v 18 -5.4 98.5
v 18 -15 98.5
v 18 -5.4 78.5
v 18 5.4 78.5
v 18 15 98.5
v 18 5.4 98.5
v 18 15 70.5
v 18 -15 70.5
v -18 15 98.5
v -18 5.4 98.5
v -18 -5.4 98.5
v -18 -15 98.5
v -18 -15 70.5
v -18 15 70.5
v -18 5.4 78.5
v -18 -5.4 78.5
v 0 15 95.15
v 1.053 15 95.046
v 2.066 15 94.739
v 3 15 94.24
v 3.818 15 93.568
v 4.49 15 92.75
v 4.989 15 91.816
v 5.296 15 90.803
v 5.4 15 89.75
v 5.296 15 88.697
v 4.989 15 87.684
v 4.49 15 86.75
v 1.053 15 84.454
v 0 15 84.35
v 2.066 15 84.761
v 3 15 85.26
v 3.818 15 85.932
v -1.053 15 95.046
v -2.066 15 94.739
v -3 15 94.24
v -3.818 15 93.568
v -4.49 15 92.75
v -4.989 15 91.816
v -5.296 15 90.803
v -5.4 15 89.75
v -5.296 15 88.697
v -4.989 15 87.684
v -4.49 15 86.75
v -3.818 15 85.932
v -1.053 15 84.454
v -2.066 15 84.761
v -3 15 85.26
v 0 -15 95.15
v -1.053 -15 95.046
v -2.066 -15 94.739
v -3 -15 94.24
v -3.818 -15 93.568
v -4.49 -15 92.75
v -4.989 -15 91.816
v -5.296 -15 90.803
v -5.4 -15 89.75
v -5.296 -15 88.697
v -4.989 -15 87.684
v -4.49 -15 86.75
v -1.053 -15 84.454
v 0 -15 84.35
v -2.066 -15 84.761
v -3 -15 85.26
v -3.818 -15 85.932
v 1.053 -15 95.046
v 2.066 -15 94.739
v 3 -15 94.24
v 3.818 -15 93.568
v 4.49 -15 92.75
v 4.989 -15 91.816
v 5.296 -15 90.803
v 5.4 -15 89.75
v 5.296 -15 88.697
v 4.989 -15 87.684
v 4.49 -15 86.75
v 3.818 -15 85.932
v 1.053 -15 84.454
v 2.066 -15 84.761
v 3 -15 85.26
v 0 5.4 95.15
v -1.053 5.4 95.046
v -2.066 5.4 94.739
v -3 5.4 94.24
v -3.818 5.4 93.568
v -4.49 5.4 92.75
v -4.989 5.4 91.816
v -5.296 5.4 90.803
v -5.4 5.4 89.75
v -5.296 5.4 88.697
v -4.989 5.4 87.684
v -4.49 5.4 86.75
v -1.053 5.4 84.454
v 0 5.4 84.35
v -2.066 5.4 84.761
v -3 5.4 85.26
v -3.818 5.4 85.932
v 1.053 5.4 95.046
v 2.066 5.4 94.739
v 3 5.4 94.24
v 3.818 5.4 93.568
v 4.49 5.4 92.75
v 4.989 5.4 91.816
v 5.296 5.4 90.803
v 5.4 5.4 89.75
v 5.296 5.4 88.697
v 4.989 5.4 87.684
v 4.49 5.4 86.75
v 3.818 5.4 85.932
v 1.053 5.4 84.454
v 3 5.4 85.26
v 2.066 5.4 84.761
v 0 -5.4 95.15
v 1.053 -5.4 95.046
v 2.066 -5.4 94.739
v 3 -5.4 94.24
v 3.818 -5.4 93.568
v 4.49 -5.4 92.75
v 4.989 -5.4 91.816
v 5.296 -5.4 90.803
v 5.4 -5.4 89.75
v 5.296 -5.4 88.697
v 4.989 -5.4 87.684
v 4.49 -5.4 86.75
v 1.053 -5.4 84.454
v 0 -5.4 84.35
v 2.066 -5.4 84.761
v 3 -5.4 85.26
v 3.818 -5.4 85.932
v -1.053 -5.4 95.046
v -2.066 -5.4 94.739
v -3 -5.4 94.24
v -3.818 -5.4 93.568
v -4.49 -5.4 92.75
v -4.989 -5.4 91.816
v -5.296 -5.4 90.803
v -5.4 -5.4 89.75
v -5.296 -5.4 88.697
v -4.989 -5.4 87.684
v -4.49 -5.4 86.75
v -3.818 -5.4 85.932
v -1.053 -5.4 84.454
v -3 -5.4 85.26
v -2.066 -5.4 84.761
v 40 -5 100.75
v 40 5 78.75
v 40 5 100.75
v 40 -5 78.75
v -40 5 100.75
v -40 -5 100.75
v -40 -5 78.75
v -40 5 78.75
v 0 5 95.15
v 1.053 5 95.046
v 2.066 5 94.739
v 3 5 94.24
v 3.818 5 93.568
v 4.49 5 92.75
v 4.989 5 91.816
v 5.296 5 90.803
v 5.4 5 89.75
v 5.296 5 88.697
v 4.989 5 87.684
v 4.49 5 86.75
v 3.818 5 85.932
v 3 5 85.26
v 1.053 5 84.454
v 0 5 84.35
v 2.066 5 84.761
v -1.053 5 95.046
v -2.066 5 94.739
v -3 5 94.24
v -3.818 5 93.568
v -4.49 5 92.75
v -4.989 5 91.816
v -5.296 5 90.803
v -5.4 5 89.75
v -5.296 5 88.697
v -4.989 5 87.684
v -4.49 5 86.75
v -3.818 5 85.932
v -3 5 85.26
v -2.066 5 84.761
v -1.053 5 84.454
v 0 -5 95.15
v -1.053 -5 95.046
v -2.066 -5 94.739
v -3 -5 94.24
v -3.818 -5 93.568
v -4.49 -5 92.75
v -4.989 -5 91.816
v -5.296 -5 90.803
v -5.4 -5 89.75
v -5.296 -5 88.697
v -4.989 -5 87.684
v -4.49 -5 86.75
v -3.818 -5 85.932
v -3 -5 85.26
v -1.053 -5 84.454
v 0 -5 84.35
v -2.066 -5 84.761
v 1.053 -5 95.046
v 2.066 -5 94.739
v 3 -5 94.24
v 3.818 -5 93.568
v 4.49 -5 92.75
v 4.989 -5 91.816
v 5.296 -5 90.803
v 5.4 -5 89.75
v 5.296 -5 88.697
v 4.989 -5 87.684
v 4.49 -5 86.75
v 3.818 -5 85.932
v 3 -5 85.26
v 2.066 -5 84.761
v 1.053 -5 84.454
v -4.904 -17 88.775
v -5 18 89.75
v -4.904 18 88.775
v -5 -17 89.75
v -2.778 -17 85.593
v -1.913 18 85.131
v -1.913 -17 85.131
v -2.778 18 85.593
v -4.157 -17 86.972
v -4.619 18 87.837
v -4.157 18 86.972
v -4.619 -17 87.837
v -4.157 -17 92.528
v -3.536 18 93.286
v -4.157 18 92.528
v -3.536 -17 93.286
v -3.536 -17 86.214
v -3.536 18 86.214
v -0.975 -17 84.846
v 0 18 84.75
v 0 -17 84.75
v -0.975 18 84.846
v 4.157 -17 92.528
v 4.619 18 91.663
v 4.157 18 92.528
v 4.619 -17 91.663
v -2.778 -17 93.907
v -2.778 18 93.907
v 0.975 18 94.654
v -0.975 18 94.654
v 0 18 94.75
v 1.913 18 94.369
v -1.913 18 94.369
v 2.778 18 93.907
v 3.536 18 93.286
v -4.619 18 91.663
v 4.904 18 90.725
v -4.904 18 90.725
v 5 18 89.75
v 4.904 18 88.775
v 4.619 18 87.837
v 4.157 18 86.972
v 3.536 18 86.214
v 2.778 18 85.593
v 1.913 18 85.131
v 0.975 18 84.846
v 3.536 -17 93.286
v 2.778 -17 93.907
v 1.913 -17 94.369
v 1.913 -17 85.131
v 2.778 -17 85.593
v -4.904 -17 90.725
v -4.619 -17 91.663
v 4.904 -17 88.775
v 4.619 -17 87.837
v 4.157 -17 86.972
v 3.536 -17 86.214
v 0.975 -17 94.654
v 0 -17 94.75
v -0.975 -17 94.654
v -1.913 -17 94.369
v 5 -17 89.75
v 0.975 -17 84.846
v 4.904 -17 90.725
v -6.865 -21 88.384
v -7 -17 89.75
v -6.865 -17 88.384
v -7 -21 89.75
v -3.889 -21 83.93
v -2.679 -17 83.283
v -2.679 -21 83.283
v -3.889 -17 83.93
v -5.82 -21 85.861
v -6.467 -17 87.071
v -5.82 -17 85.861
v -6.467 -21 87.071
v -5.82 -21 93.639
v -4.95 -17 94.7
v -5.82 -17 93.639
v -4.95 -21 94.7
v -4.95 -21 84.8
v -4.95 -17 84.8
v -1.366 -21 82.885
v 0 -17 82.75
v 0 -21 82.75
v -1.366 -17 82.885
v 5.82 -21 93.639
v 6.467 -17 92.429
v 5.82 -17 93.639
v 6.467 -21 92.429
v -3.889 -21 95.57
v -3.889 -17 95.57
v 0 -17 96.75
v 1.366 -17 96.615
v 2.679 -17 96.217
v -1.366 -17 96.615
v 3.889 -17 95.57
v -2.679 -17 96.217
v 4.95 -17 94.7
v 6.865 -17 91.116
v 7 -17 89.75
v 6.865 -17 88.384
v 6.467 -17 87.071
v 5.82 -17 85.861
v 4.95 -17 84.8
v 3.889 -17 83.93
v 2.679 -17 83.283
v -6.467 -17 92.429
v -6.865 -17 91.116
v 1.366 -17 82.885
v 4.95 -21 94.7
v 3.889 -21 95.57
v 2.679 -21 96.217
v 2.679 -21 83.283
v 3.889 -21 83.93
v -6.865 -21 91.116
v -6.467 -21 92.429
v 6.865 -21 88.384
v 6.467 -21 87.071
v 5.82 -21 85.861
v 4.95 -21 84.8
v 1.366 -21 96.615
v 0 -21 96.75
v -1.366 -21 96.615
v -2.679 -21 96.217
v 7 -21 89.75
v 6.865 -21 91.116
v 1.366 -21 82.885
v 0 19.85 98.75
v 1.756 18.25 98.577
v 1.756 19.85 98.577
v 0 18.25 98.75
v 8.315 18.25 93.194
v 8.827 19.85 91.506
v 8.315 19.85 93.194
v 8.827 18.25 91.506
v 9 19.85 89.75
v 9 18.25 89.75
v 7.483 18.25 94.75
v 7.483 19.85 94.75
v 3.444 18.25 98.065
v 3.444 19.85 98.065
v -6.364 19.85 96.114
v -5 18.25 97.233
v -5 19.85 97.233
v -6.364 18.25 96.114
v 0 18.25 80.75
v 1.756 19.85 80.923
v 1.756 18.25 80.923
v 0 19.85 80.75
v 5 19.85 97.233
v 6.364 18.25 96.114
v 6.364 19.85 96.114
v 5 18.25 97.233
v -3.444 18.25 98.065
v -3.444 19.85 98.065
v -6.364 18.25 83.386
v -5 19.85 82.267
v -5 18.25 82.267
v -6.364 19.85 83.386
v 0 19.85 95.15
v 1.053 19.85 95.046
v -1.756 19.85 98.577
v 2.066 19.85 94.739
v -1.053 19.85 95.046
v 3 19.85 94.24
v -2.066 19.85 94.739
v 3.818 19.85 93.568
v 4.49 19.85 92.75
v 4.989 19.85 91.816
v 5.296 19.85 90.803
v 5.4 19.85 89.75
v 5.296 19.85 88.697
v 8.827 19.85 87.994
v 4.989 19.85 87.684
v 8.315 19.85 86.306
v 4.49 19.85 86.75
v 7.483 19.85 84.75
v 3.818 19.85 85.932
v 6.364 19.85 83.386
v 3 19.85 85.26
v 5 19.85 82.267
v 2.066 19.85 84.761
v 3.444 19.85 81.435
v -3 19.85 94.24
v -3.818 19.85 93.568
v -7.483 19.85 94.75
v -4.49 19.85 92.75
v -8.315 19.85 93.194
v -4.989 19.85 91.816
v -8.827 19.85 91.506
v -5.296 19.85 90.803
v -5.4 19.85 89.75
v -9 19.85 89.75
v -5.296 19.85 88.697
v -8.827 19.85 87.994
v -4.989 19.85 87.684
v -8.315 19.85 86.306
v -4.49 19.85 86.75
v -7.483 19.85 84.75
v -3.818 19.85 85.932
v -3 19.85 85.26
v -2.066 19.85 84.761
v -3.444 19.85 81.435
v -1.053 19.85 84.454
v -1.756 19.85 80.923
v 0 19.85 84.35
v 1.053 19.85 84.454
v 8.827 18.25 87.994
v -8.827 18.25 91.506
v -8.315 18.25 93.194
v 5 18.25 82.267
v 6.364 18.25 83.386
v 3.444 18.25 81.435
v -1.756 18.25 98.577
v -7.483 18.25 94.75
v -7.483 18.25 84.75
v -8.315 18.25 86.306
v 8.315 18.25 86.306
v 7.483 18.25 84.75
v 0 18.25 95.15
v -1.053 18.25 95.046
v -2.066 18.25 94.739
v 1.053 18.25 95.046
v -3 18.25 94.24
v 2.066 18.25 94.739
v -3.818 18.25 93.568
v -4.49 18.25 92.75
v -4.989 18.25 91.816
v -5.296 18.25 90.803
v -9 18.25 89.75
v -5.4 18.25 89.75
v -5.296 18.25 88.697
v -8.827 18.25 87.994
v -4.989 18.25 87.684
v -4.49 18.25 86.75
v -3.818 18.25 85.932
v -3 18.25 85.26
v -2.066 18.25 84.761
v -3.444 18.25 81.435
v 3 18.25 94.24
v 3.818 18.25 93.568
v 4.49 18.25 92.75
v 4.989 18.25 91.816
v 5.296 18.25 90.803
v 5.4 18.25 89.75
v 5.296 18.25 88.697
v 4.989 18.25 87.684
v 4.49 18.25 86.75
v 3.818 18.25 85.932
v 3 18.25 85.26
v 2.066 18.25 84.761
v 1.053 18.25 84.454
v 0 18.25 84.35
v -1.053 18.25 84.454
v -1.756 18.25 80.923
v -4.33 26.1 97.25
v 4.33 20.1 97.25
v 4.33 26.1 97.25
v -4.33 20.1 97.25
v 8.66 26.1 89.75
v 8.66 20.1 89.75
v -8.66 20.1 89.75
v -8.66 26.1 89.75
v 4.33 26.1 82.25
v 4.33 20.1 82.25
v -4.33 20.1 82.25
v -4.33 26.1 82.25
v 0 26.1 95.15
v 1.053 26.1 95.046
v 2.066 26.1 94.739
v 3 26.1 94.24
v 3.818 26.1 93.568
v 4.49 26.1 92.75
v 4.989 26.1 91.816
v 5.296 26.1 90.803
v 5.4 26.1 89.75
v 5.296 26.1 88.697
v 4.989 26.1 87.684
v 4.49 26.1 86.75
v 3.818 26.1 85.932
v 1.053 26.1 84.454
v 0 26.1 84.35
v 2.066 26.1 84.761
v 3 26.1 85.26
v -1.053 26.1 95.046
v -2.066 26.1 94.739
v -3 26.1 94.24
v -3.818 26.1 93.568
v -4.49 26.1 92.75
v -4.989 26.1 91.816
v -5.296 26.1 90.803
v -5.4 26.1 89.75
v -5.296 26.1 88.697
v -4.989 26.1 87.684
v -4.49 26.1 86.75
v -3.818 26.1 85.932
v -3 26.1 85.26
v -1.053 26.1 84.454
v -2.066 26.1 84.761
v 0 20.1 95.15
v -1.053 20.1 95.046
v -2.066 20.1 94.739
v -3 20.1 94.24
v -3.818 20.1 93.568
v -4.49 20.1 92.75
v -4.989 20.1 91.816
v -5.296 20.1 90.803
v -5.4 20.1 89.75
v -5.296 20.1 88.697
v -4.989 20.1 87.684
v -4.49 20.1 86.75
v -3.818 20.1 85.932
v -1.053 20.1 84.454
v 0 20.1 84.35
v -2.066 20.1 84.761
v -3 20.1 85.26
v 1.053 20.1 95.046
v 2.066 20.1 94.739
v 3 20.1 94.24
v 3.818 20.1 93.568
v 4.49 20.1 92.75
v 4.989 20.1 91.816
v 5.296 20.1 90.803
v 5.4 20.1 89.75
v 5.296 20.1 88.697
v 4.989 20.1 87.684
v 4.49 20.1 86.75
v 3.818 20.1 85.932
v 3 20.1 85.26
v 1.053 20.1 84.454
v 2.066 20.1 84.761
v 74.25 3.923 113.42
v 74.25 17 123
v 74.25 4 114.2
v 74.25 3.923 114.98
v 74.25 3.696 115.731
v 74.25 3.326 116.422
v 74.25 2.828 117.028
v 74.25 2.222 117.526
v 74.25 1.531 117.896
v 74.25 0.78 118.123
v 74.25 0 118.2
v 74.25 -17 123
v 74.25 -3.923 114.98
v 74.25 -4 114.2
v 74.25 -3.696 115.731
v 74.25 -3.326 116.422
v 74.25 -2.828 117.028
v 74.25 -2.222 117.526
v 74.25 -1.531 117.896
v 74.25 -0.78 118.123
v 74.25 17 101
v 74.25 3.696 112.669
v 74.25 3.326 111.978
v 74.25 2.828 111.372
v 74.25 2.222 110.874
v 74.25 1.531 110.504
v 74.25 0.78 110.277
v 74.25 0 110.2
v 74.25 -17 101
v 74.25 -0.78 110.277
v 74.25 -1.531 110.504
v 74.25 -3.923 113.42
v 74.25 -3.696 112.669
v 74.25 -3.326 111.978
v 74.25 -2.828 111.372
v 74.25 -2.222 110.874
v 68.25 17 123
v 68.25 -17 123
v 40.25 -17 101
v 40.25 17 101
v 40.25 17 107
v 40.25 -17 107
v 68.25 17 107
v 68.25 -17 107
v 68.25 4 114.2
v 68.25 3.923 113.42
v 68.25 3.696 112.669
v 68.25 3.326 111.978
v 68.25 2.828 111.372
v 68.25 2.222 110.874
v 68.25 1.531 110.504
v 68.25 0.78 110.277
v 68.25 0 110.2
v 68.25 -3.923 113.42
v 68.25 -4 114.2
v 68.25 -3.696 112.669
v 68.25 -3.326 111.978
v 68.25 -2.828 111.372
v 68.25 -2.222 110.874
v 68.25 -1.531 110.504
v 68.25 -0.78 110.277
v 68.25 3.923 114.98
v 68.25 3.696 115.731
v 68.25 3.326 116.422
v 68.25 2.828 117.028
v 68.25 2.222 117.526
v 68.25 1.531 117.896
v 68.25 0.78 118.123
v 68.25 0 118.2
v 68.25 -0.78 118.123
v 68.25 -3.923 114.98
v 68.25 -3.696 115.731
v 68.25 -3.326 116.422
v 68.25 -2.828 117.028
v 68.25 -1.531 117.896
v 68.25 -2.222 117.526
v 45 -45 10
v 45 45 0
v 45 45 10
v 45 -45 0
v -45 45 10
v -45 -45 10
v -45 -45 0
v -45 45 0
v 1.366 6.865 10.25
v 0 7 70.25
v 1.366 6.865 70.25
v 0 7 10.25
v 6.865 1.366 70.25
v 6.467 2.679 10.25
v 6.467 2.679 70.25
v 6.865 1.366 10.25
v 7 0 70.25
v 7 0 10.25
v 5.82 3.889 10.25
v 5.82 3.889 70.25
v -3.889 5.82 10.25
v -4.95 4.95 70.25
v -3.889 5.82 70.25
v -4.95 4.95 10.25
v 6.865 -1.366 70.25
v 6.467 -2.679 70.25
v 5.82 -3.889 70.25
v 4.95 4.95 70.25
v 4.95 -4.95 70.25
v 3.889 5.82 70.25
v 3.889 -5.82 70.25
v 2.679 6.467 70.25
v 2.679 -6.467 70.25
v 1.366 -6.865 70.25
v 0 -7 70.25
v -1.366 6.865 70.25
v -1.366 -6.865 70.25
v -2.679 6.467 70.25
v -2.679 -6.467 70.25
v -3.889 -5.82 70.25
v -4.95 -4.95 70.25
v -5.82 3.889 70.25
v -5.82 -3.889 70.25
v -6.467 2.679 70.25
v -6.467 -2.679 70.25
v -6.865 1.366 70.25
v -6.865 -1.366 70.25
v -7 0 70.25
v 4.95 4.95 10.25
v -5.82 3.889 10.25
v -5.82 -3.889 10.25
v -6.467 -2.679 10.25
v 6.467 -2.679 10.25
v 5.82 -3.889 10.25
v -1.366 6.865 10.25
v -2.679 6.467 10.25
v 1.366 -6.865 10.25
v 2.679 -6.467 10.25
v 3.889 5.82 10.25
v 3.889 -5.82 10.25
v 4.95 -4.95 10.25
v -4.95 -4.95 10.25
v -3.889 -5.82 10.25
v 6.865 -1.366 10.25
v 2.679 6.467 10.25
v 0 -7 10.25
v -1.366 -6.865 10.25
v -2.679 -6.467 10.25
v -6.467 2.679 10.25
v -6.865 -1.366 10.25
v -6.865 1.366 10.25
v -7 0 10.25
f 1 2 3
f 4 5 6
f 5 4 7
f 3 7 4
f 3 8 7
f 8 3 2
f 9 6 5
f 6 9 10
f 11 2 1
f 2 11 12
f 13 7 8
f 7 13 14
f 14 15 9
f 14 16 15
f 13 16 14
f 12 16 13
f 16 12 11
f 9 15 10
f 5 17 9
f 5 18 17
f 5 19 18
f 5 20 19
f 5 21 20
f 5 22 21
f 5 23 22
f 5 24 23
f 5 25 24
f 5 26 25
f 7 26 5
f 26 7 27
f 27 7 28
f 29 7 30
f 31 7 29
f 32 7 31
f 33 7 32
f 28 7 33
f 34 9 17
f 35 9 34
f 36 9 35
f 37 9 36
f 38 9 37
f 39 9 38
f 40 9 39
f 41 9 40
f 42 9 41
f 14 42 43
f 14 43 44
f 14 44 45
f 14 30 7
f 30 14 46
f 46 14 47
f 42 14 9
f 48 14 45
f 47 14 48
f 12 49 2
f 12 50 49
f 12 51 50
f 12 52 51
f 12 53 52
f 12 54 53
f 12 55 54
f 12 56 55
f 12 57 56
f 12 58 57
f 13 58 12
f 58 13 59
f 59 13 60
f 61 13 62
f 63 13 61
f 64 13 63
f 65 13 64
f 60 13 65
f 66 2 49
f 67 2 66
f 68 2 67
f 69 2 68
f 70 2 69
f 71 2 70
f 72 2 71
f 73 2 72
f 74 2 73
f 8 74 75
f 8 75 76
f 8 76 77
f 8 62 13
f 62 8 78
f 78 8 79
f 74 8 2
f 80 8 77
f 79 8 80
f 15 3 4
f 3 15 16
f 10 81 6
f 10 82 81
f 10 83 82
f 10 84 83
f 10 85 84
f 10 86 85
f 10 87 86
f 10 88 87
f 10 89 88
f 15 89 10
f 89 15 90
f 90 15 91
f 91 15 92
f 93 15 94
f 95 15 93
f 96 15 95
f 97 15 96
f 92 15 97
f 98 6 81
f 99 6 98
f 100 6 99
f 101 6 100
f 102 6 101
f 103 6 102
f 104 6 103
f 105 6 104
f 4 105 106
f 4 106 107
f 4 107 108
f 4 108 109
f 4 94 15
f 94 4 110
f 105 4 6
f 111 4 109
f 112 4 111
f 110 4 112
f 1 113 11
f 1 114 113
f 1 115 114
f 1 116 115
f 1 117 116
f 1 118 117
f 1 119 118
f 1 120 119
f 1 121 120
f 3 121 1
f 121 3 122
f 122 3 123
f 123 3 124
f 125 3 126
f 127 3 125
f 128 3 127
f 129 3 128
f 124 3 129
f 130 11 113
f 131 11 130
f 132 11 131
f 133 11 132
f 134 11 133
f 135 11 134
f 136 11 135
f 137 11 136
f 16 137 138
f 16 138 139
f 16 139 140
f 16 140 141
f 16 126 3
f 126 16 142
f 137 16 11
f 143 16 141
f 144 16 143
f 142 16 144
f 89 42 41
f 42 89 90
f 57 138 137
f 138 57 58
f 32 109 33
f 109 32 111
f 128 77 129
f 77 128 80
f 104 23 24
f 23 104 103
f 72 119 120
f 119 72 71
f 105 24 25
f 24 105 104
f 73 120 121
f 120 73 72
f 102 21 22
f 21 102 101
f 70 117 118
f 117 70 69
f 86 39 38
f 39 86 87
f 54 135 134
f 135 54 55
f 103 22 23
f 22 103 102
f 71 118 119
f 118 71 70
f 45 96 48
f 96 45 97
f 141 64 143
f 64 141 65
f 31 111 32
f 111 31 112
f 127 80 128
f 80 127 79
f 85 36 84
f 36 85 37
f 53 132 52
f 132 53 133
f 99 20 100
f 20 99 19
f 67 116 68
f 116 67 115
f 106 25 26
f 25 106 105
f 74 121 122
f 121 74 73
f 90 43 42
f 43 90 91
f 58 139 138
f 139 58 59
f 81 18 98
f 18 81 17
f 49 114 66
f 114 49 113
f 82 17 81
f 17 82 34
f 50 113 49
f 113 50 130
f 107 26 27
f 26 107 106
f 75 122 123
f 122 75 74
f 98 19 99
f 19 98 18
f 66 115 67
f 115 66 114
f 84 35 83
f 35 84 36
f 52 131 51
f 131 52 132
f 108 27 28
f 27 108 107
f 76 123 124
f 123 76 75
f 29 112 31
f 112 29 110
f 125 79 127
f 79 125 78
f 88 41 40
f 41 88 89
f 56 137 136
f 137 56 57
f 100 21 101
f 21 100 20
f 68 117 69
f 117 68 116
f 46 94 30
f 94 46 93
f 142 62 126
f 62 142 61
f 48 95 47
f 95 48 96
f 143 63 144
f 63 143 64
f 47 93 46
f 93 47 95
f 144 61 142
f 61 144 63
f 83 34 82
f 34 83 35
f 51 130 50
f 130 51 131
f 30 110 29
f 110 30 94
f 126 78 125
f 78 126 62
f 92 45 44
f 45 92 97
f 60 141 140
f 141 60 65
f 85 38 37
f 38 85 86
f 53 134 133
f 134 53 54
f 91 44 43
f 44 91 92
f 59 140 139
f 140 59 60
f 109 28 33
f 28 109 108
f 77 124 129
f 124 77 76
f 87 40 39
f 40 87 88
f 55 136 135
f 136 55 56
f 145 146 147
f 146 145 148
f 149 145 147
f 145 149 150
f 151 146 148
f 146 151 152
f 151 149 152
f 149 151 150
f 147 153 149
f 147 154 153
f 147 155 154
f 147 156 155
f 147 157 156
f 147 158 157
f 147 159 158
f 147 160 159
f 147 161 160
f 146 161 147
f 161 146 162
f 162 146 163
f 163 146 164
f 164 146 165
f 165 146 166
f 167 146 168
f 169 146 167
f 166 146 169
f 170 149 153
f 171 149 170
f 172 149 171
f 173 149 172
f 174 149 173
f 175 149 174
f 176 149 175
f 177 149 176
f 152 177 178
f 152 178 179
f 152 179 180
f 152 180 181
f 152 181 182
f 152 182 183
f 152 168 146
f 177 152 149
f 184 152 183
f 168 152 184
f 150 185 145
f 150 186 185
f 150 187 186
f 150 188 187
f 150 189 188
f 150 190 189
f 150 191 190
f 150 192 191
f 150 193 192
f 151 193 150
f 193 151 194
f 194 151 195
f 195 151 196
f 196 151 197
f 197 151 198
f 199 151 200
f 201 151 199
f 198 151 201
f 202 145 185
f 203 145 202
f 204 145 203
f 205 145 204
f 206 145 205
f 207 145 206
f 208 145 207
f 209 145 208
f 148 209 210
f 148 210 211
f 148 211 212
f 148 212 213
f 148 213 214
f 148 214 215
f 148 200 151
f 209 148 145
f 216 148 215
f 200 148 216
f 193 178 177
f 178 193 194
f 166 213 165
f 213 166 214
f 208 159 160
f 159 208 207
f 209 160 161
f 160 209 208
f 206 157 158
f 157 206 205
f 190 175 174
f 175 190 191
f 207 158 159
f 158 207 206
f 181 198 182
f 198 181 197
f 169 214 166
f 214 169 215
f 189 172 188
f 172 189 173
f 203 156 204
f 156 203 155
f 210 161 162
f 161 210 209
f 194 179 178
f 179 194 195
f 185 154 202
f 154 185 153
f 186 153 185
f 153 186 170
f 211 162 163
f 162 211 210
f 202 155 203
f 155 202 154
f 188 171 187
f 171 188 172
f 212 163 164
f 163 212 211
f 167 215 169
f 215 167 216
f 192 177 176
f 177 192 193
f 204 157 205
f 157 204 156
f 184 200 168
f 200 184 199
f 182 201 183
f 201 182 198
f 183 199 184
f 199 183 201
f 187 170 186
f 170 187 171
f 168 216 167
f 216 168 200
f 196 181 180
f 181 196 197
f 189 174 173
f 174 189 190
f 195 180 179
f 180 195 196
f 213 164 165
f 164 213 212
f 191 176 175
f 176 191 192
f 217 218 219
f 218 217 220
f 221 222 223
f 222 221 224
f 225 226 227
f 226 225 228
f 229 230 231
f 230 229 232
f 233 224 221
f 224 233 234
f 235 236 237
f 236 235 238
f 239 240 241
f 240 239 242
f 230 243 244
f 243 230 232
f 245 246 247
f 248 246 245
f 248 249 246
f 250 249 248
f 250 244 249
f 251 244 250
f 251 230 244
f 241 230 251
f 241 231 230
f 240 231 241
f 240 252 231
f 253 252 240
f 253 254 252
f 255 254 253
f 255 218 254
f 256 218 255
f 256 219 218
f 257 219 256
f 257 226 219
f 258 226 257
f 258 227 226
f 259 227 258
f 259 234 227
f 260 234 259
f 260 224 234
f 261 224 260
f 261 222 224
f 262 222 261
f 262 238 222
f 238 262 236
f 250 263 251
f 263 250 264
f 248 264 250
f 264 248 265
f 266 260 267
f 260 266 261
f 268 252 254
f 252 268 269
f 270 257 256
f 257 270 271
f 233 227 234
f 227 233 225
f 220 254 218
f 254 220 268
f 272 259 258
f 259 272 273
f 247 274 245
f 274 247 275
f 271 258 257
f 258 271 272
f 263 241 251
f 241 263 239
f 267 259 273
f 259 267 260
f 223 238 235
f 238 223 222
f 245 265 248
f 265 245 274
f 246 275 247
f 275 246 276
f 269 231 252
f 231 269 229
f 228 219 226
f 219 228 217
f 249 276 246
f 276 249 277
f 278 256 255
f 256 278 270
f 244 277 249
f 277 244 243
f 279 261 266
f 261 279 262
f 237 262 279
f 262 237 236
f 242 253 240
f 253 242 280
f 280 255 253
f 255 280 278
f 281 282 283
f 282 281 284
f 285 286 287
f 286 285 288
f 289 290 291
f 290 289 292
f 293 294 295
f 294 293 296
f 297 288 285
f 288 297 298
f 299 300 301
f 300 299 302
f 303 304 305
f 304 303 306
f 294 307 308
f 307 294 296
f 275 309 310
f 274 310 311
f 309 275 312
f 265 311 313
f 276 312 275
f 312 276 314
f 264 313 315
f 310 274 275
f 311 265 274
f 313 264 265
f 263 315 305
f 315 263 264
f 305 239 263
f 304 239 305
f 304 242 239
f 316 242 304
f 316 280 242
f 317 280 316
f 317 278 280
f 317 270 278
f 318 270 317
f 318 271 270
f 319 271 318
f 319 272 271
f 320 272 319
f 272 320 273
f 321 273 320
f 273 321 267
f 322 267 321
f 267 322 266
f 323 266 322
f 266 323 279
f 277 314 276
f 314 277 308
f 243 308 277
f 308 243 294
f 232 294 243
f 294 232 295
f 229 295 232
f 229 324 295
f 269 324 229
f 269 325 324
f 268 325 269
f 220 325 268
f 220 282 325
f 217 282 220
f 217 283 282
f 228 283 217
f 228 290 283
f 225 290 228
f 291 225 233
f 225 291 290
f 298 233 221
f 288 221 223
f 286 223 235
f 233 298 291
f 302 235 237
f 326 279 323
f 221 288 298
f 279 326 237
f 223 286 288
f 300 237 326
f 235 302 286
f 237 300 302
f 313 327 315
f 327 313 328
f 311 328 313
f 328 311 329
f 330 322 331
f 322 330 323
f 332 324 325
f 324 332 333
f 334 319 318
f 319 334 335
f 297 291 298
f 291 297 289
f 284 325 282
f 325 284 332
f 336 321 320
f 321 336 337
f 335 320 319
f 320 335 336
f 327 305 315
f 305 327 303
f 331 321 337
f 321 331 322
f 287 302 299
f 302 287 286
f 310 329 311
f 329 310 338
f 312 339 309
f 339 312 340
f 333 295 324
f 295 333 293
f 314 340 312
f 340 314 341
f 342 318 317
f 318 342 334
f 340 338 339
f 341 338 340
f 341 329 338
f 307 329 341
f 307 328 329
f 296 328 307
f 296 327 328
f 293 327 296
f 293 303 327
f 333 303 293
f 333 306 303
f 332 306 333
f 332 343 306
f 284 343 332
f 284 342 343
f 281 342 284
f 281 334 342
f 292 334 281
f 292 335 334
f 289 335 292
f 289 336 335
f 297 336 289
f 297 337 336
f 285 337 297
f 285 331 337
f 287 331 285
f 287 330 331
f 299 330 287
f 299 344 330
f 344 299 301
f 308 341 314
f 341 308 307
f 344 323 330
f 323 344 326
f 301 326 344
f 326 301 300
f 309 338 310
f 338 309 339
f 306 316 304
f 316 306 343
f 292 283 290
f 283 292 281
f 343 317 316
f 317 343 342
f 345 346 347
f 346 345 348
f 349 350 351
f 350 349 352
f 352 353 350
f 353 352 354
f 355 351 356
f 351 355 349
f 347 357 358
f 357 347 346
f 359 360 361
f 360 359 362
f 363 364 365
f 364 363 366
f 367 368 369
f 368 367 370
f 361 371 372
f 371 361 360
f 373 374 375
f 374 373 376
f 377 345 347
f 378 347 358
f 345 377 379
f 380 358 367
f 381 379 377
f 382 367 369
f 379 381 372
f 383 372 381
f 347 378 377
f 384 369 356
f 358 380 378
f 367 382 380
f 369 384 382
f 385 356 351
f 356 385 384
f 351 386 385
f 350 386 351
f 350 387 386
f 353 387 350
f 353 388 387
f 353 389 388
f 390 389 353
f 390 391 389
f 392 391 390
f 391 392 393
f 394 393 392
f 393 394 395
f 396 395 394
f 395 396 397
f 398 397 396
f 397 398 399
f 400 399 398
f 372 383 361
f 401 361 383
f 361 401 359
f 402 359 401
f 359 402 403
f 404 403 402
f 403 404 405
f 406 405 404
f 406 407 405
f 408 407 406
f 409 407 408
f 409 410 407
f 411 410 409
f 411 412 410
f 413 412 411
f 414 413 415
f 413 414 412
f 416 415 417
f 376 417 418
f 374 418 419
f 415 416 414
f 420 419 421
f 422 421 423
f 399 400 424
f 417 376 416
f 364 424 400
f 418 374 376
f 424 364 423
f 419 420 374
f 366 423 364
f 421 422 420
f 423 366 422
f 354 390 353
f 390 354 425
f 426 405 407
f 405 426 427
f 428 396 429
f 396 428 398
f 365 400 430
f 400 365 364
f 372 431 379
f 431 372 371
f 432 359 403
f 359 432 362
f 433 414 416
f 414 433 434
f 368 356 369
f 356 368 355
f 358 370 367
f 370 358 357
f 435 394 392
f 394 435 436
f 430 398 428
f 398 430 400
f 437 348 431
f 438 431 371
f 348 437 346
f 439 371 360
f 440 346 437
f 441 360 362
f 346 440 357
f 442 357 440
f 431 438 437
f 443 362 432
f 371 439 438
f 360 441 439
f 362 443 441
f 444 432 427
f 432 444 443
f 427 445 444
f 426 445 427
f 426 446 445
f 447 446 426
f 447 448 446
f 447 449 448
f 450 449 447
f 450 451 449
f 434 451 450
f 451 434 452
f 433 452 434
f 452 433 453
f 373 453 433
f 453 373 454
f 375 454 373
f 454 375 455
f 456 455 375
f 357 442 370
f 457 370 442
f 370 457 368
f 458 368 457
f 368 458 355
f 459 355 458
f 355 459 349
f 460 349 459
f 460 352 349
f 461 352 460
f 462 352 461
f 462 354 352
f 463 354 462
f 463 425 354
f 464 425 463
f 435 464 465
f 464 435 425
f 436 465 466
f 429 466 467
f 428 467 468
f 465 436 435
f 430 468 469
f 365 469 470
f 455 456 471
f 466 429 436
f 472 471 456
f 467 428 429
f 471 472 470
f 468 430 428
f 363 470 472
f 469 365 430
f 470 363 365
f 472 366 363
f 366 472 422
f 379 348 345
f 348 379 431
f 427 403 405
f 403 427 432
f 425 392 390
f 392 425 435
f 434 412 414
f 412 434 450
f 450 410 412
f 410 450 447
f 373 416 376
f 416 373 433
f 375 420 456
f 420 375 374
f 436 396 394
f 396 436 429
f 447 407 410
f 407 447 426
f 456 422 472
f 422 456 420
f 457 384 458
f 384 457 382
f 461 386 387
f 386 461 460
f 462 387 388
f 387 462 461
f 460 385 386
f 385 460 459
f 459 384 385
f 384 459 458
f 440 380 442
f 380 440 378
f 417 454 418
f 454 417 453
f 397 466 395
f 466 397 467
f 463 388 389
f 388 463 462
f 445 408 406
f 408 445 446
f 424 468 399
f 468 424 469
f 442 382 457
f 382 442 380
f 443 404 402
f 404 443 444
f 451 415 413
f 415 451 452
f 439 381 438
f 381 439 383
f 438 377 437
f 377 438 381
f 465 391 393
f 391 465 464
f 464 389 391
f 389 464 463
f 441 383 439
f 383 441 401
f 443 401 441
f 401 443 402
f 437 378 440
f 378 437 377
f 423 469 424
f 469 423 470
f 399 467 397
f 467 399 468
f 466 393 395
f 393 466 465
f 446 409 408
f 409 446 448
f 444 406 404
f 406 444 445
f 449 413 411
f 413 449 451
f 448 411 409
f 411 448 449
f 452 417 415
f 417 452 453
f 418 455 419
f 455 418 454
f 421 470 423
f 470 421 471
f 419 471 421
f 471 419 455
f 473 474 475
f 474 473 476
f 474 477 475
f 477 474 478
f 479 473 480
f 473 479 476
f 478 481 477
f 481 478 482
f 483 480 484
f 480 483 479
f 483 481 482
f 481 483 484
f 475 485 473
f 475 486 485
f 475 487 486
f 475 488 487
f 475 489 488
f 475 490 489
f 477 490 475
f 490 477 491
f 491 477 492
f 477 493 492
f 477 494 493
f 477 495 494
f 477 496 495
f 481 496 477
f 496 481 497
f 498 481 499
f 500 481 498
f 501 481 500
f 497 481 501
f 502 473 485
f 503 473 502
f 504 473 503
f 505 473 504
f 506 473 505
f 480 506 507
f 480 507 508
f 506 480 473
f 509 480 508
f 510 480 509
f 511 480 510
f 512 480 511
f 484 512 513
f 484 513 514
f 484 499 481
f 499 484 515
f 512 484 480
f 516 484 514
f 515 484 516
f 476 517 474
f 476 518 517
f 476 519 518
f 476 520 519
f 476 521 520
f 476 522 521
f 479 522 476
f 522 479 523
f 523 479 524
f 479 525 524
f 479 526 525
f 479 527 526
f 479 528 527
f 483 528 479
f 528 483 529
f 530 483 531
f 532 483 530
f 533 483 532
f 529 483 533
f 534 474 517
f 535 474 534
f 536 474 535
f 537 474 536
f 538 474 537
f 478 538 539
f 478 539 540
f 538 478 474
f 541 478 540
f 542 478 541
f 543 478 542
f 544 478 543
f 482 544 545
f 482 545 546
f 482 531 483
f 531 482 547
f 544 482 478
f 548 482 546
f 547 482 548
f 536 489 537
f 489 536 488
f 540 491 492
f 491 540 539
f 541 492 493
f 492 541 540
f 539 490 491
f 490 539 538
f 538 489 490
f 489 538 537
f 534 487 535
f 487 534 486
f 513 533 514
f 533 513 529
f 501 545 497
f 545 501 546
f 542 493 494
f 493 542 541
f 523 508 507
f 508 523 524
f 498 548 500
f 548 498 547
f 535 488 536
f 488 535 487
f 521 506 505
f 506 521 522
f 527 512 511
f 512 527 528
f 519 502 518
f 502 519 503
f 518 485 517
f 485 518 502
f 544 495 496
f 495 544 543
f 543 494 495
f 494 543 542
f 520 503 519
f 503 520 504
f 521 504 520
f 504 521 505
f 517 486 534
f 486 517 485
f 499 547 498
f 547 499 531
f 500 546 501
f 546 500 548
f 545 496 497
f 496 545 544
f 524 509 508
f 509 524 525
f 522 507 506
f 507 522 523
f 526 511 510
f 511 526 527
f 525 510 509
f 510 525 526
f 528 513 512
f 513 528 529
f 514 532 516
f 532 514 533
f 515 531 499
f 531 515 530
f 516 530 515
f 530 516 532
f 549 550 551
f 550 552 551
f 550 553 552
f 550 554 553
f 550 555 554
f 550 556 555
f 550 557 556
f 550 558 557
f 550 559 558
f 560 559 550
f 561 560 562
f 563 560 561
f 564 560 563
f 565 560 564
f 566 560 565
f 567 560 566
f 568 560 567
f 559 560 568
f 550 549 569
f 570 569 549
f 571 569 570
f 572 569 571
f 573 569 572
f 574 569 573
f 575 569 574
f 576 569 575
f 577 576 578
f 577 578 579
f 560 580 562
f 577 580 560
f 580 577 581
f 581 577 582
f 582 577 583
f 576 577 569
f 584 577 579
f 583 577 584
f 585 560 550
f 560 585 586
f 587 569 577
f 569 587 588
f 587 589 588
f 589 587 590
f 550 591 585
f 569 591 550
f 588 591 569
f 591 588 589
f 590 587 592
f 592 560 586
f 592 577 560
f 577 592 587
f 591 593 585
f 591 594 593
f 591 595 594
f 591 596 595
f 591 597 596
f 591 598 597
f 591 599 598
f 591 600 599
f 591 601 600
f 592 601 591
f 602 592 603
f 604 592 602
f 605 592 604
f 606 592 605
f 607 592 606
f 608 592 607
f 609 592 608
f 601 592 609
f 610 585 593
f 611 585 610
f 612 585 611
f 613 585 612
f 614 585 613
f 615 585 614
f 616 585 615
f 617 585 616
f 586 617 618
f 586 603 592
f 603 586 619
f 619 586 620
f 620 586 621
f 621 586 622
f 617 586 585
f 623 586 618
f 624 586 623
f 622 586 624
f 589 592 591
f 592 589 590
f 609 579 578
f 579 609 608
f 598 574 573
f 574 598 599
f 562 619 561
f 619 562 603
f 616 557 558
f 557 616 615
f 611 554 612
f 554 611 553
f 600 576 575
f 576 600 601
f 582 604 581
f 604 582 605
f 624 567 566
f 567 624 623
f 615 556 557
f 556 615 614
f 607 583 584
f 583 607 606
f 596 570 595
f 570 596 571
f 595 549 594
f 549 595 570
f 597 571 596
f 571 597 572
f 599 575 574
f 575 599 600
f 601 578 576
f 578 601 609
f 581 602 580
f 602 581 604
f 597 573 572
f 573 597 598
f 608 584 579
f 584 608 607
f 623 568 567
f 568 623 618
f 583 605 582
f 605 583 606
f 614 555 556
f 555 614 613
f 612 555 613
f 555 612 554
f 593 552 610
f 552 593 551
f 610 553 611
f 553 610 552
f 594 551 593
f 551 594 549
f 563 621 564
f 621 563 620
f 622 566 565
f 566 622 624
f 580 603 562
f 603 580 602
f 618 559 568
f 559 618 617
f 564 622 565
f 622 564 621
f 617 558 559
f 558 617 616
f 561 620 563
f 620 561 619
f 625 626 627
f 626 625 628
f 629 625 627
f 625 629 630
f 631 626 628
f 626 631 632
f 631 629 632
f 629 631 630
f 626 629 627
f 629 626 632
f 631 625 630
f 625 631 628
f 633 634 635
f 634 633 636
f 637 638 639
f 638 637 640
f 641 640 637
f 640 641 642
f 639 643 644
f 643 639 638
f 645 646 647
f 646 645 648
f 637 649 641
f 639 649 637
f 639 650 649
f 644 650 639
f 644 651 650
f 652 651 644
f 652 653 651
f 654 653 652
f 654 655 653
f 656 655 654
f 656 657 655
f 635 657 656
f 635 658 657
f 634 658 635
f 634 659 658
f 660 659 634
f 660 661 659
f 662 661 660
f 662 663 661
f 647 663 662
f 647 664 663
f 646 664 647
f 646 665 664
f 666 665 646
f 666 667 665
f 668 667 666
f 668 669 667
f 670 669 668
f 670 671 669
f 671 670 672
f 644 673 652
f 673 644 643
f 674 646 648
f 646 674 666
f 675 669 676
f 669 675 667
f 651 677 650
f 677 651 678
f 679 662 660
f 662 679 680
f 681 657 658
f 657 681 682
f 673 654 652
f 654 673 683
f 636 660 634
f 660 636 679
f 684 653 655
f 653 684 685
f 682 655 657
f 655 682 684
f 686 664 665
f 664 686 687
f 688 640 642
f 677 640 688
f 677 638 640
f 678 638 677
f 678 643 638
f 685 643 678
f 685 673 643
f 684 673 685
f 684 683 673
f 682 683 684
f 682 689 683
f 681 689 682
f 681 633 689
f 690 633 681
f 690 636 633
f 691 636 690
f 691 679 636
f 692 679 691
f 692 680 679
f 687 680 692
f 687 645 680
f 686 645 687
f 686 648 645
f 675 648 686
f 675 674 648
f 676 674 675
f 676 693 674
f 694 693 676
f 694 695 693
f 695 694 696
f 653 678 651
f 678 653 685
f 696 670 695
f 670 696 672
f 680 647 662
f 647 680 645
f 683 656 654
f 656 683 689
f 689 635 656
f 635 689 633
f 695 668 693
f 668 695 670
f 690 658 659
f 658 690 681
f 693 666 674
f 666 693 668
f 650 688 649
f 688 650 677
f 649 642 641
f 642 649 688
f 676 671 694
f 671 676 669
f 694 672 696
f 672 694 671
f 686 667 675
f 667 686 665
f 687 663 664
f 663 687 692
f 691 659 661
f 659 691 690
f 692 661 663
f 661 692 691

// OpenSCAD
$fn = 32;

// ------------------------------------------------------------------------
// Lamp arm: column d14 x 60 mm, arm 80 mm
// Every part is its own module, assembly() places every instance.
// ------------------------------------------------------------------------

// --- part 1 ---
module lamp_base() {
  difference() {
    translate([-45, -45, 0]) cube([90, 90, 10]);
  }
}

// --- part 2 ---
module lamp_column() {
  cylinder(h = 60, d = 14);
}

// --- part 3 ---
module head_fork() {
  difference() {
    translate([-18, -15, 0]) cube([36, 30, 28]);
    translate([-19, -5.4, 8]) cube([38, 10.8, 21]);
    translate([0, 0, 19.25]) rotate([90, 0, 0]) cylinder(h = 32, d = 10.8, center = true);
  }
}

// --- part 4 ---
module lamp_arm() {
  difference() {
    translate([-40, -5, 0]) cube([80, 10, 22]);
    translate([0, 0, 11]) rotate([90, 0, 0]) cylinder(h = 12, d = 10.8, center = true);
  }
}

// --- part 5 ---
module arm_pin() {
  rotate([0, 90, 0]) cylinder(h = 36, d = 10, center = true);
  translate([-21, 0, 0]) rotate([0, 90, 0]) cylinder(h = 4, d = 14);
}

// --- part 6 ---
module arm_washer() {
  difference() {
      translate([0, 0, 0]) cylinder(h = 1.6, d = 18);
      translate([0, 0, -1]) cylinder(h = 3.6, d = 10.8);
    }
}

// --- part 7 ---
module arm_nut() {
  difference() {
    linear_extrude(height = 6) polygon(points = [[8.66, 0], [4.33, 7.5], [-4.33, 7.5], [-8.66, 0], [-4.33, -7.5], [4.33, -7.5]]);
    translate([0, 0, -1]) cylinder(h = 8, d = 10.8);
  }
}

// --- part 8 ---
module shade_bracket() {
  difference() {
    translate([-17, -17, 0]) cube([34, 34, 22]);
    translate([-18, -18, 6]) cube([29, 36, 17]);
    translate([14, 0, 13.2]) rotate([0, 90, 0]) cylinder(h = 8, d = 8, center = true);
  }
}

// --- assembly ---
module assembly() {
  color([0.80, 0.24, 0.20]) translate([0, 0, 0]) rotate([0, 0, 0]) lamp_base();
  color([0.20, 0.45, 0.75]) translate([0, 0, 10.25]) rotate([0, 0, 0]) lamp_column();
  color([0.25, 0.62, 0.32]) translate([0, 0, 70.5]) rotate([0, 0, 0]) head_fork();
  color([0.92, 0.70, 0.18]) translate([0, 0, 78.75]) rotate([0, 0, 0]) lamp_arm();
  color([0.58, 0.35, 0.70]) translate([0, 0, 89.75]) rotate([0, 0, 90]) arm_pin();
  color([0.16, 0.66, 0.66]) translate([0, 19.85, 89.75]) rotate([90, 0, 0]) arm_washer();
  color([0.85, 0.48, 0.18]) translate([0, 26.1, 89.75]) rotate([90, 0, 0]) arm_nut();
  color([0.55, 0.60, 0.65]) translate([57.25, 0, 101]) rotate([0, 0, 0]) shade_bracket();
}

assembly();
